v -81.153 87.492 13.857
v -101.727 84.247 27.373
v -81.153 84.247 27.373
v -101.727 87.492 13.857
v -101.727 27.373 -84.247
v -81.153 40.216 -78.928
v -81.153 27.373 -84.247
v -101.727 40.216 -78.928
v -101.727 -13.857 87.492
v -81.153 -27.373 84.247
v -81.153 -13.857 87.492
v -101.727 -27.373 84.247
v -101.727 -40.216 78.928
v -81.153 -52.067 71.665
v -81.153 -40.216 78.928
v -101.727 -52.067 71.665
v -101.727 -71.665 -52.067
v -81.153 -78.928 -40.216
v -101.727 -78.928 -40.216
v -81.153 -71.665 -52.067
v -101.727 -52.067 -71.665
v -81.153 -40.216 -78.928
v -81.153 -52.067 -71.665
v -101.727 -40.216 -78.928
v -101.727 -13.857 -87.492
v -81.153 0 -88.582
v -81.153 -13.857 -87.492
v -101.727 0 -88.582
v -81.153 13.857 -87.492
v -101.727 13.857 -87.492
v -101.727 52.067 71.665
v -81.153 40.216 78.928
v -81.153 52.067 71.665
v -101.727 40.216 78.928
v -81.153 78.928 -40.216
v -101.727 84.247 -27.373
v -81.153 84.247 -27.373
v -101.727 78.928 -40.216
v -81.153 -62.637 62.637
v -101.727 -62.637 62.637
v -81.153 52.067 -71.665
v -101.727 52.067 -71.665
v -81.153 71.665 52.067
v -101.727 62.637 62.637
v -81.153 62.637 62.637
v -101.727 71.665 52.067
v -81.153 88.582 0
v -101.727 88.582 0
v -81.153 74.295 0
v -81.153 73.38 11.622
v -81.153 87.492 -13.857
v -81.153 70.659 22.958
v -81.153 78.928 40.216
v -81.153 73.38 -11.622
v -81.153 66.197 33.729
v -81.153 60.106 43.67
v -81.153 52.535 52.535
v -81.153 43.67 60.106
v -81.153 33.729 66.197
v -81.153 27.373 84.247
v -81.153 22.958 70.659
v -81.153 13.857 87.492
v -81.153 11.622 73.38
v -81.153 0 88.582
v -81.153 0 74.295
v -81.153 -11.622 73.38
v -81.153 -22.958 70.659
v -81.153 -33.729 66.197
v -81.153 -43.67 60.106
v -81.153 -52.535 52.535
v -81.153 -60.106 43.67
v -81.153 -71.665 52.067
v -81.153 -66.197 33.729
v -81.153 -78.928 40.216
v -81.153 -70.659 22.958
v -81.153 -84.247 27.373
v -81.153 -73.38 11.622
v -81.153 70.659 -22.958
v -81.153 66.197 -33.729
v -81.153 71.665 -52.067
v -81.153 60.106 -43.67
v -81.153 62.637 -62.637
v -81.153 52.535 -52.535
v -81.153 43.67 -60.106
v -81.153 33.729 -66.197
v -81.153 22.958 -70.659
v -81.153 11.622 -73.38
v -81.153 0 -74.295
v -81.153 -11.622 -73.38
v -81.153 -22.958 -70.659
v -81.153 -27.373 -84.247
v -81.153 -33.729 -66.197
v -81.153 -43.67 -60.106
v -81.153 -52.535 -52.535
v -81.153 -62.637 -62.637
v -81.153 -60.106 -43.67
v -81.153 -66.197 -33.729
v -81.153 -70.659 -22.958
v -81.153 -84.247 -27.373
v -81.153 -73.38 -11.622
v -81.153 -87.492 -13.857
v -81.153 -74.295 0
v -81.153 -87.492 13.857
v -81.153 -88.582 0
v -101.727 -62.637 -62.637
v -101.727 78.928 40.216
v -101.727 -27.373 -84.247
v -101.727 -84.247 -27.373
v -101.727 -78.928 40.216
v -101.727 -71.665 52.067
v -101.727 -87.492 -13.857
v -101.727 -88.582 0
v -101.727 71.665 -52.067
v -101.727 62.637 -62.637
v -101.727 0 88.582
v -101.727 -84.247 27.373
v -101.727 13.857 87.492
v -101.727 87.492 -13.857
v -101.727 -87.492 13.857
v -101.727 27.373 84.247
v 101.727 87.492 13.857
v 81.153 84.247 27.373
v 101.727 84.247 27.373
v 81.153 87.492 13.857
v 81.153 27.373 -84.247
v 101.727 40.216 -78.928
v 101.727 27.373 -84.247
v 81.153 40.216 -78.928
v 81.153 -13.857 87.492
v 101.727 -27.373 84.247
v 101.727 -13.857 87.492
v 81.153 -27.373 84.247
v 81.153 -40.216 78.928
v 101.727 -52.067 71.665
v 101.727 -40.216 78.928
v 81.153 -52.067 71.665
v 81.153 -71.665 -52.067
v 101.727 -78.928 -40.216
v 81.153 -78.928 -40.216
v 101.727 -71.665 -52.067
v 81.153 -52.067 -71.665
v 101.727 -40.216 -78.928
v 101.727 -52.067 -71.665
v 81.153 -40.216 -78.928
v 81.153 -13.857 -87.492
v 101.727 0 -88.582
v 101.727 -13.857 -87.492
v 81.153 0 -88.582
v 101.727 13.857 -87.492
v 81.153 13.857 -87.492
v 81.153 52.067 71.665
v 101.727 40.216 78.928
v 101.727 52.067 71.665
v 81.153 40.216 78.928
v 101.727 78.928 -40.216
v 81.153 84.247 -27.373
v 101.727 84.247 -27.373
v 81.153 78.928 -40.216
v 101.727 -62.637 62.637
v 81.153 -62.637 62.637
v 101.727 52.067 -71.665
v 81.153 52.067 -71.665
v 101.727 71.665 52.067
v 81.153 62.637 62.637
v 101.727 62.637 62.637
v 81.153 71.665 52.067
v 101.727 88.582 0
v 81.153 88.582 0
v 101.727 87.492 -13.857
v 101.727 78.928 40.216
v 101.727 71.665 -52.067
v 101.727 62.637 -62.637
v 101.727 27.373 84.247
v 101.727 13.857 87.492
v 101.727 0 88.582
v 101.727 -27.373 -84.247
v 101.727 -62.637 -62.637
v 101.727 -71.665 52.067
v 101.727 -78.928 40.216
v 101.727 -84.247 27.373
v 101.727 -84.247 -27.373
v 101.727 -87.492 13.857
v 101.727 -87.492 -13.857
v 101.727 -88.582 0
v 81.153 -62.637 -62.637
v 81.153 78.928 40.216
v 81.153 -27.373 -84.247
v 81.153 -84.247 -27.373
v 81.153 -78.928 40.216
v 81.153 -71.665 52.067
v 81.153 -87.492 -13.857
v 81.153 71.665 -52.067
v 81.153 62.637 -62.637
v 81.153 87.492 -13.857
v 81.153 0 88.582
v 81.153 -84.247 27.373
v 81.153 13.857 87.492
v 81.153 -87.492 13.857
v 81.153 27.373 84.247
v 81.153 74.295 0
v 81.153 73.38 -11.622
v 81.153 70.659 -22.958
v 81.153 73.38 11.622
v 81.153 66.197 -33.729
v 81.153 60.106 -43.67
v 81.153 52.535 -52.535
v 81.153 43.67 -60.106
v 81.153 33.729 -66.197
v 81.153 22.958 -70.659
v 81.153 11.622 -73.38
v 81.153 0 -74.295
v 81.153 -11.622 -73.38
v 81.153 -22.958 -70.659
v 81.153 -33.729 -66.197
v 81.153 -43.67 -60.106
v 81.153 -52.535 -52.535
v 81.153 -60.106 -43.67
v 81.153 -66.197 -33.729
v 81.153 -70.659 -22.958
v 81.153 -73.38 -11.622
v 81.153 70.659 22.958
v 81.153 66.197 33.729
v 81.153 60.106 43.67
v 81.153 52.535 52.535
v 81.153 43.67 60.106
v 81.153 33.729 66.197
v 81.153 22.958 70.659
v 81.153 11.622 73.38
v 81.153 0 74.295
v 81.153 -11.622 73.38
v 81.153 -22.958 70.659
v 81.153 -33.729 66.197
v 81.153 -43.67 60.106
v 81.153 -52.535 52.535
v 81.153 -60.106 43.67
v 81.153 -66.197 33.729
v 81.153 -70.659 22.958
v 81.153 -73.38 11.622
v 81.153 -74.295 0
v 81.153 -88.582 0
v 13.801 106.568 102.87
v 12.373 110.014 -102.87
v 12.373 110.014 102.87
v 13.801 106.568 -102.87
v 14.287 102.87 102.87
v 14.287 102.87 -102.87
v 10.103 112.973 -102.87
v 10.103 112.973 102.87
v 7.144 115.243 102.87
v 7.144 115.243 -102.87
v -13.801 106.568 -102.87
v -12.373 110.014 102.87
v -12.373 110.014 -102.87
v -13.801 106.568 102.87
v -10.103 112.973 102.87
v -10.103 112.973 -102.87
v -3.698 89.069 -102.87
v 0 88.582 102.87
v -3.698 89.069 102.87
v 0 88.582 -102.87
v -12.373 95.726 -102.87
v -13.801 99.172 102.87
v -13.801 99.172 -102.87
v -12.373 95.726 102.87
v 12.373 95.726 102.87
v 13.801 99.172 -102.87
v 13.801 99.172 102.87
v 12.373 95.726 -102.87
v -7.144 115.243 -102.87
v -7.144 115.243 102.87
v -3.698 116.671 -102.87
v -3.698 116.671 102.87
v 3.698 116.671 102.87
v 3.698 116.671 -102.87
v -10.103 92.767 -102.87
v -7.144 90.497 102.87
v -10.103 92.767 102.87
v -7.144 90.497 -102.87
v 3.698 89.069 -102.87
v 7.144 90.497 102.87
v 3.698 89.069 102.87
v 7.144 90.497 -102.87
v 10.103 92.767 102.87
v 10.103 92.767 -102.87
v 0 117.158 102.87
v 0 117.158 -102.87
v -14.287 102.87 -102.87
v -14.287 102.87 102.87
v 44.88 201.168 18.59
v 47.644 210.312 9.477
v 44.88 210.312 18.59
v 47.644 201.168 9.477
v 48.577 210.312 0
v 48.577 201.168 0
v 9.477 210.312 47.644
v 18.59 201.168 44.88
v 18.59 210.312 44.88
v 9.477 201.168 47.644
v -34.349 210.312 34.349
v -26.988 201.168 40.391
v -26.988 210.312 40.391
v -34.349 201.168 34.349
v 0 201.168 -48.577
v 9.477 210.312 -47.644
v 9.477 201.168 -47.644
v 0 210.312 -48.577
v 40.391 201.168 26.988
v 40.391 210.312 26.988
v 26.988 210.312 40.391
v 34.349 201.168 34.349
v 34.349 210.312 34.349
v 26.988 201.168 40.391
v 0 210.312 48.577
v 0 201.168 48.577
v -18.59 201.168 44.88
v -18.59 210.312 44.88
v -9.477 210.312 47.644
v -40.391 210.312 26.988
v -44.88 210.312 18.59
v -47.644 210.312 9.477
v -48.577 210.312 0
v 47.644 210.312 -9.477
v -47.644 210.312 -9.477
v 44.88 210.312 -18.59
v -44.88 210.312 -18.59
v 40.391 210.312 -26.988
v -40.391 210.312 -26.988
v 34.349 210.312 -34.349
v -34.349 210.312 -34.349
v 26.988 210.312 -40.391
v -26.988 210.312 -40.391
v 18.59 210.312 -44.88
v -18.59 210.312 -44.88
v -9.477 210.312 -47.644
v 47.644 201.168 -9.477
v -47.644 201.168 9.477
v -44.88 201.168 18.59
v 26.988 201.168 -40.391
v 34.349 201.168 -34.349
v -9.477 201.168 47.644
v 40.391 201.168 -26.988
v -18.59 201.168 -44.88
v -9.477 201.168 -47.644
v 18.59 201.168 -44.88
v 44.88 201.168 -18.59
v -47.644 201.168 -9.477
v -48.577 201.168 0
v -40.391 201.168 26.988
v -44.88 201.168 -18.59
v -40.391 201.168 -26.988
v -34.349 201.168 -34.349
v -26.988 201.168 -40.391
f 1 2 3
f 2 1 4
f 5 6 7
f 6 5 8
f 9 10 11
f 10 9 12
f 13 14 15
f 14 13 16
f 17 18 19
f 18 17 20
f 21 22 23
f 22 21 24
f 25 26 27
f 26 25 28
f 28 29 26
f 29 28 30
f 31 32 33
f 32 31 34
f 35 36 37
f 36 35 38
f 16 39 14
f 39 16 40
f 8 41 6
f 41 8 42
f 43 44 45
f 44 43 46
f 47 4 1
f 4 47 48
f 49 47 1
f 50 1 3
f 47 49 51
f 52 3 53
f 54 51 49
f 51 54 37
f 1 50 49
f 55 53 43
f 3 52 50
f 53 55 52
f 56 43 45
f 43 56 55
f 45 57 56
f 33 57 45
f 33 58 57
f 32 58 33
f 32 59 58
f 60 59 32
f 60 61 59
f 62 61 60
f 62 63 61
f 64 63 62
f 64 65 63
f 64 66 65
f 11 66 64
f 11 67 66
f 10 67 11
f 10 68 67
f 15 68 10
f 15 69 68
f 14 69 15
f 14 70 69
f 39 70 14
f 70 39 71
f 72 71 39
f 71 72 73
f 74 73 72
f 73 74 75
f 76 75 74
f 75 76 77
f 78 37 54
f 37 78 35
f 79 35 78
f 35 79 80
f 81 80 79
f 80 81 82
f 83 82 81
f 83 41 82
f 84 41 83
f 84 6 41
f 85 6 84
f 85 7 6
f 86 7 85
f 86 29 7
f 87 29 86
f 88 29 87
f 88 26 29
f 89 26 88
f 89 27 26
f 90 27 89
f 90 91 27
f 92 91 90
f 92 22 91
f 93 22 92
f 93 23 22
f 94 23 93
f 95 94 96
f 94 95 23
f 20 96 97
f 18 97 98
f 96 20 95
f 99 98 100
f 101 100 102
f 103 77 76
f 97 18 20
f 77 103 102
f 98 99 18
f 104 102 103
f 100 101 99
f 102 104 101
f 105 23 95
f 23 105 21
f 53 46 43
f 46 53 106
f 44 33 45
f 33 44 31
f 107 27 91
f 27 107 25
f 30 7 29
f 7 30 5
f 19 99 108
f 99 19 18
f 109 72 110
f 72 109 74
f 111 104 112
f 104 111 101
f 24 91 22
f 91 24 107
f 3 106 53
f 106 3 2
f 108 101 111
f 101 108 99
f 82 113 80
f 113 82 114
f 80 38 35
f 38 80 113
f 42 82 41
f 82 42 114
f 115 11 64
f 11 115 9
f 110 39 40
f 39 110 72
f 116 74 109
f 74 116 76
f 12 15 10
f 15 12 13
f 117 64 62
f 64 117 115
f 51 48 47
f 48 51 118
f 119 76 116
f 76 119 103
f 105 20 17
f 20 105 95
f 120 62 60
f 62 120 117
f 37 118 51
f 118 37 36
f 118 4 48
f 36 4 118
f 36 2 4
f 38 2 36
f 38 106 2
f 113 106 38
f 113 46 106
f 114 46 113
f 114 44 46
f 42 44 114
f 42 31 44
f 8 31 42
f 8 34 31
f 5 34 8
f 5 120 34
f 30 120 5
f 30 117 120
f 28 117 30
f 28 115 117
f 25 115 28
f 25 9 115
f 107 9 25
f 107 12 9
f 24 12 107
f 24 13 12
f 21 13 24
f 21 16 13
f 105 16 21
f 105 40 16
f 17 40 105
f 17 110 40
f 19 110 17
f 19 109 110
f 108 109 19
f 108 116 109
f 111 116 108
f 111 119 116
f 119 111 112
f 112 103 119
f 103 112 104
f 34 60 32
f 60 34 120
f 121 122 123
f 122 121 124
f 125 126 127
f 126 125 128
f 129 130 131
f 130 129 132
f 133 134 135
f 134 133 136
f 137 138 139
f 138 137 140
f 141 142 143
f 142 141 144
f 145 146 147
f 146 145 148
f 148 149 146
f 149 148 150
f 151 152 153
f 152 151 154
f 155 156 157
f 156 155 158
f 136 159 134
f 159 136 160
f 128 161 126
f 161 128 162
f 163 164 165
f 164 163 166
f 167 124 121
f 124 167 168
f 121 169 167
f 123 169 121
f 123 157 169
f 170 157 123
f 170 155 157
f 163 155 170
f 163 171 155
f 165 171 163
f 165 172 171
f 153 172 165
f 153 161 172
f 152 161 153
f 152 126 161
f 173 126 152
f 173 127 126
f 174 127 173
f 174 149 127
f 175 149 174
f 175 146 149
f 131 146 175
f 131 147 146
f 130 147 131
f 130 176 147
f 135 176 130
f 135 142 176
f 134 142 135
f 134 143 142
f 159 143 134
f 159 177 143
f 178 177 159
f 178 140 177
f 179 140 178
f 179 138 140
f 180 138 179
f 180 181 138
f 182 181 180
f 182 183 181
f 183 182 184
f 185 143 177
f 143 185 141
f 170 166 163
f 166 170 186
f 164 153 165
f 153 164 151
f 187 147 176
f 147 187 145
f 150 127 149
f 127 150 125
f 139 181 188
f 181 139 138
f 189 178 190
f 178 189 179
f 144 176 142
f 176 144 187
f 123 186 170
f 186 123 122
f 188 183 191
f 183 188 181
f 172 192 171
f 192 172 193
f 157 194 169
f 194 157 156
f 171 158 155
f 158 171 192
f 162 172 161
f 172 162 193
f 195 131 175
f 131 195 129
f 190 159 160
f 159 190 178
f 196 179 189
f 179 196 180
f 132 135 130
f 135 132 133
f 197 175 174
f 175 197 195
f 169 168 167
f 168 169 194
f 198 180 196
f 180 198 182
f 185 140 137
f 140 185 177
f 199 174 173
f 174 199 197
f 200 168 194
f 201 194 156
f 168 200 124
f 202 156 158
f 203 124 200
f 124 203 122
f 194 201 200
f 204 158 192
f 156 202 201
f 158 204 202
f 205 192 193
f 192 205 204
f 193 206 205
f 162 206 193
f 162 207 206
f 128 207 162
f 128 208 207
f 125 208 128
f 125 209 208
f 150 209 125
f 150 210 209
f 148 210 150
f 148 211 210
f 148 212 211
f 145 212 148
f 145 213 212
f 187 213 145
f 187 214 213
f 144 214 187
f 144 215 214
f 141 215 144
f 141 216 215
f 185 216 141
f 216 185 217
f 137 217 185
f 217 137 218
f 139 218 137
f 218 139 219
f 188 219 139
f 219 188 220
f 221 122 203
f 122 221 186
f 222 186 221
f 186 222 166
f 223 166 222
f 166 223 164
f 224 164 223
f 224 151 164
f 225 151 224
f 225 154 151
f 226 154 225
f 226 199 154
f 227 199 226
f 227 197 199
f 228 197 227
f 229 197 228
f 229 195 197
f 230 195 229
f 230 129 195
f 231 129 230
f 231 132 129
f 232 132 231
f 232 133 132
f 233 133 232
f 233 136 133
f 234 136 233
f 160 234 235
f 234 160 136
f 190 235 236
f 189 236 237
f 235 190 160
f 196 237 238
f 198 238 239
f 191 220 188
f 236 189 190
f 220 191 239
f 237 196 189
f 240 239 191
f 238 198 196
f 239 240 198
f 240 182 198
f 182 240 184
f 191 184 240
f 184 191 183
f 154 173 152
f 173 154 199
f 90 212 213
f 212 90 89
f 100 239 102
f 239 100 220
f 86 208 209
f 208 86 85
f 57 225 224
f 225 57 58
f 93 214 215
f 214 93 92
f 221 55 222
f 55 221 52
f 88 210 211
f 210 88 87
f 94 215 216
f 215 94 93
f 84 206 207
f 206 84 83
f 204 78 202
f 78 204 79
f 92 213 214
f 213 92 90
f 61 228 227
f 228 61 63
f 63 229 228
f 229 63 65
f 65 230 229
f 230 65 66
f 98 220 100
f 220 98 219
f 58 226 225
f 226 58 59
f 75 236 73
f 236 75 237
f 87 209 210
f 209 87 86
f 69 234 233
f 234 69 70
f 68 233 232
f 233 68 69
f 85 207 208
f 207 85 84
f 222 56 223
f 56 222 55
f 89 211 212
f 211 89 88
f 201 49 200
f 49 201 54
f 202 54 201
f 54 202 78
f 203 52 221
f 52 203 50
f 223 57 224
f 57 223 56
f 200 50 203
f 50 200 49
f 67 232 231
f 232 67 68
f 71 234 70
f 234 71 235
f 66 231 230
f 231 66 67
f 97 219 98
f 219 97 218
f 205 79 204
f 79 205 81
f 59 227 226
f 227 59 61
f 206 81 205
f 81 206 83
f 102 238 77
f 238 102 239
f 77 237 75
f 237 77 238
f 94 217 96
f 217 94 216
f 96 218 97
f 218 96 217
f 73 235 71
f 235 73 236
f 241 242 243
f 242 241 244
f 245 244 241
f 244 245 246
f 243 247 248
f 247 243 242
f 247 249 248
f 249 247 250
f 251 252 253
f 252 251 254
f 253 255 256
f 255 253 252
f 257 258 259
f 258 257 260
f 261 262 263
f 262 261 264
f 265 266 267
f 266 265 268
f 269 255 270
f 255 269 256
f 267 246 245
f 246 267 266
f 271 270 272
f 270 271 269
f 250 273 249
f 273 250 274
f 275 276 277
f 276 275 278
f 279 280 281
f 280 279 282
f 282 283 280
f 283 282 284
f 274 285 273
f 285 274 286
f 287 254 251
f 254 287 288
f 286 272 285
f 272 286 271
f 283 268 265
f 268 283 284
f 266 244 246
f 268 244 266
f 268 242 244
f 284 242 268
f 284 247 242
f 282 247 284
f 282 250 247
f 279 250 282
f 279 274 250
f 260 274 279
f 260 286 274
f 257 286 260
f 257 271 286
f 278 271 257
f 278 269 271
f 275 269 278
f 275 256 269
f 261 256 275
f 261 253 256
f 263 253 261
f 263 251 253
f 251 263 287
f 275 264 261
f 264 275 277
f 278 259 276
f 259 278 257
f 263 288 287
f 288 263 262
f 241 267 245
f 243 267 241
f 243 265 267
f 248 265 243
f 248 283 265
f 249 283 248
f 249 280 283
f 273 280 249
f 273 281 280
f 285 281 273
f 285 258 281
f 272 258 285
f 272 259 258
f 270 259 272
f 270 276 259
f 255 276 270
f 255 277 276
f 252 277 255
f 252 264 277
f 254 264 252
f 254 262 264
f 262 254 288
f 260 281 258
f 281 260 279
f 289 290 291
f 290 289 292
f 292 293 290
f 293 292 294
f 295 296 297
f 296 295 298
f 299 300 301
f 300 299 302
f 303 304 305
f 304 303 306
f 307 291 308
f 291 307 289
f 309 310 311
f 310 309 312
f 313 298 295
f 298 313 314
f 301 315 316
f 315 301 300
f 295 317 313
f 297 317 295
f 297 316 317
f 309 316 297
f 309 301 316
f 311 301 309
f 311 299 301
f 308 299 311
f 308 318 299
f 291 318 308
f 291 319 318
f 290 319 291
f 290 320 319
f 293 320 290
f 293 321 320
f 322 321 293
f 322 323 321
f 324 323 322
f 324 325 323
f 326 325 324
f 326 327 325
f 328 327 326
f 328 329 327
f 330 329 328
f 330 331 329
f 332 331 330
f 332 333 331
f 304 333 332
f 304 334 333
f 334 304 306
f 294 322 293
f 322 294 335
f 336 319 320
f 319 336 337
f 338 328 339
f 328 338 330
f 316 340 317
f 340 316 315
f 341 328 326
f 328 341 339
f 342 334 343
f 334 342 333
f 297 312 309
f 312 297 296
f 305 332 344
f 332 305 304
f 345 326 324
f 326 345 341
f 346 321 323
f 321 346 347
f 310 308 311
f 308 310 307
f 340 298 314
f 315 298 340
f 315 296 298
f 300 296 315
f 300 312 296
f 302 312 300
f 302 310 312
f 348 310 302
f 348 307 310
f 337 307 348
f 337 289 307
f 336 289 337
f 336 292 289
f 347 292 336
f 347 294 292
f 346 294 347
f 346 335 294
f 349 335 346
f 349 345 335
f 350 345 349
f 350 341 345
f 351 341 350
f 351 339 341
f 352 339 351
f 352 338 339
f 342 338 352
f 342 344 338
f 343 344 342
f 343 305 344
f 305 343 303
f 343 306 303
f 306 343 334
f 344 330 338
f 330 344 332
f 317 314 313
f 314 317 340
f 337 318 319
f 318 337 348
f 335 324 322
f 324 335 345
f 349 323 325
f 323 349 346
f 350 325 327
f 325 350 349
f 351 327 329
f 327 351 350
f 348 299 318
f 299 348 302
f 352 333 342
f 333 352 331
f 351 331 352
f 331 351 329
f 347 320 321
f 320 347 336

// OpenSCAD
// Inline valve body — OS&Y gate / butterfly / check / ball.
// Body along X, stem up +Y.
//
//   inlet:  (-L/2, 0, 0), dir (-1, 0, 0)
//   outlet: (+L/2, 0, 0), dir (+1, 0, 0)

// @part valve_inline
// @kind valve
// @category valve.check.inline
// @display-name "Inline Check Valve (4\" Grooved)"
// @mfg victaulic
// @mfg-pn Series-717
// @listing UL FM
// @price-usd 320.00
// @install-minutes 30
// @crew journeyman
// @param size_in enum[2,2.5,3,4,5,6,8,10] default=4 label="Size" unit="in"
// @port run_in  position=[-0.091,0,0] direction=[-1,0,0] style=grooved size_in=4 role=run_a
// @port run_out position=[ 0.091,0,0] direction=[ 1,0,0] style=grooved size_in=4 role=run_b

size_in = 4;
stem_ratio = 1.8;   // OS&Y handwheels extend well above the body

function od_mm(nps) =
    nps ==   2  ? 60.3 :
    nps == 2.5  ? 73.0 :
    nps ==   3  ? 88.9 :
    nps ==   4  ? 114.3 :
    nps ==   5  ? 141.3 :
    nps ==   6  ? 168.3 :
    nps ==   8  ? 219.1 :
    nps ==  10  ? 273.0 : 114.3;

od = od_mm(size_in);
body_len = od * 1.6;
stem_len = od * stem_ratio;

union() {
    // Body
    rotate([0, 90, 0])
        cylinder(h = body_len, d = od * 1.3, center = true, $fn = 40);
    // Flange faces
    for (dx = [-body_len/2, body_len/2])
        translate([dx, 0, 0])
            rotate([0, 90, 0])
            cylinder(h = od * 0.18, d = od * 1.55, center = true, $fn = 40);
    // Stem
    translate([0, stem_len/2, 0])
        cylinder(h = stem_len, d = od * 0.25, center = true, $fn = 24);
    // Handwheel
    translate([0, stem_len, 0])
        rotate([90, 0, 0])
        cylinder(h = od * 0.08, d = od * 0.85, center = true, $fn = 32);
}
